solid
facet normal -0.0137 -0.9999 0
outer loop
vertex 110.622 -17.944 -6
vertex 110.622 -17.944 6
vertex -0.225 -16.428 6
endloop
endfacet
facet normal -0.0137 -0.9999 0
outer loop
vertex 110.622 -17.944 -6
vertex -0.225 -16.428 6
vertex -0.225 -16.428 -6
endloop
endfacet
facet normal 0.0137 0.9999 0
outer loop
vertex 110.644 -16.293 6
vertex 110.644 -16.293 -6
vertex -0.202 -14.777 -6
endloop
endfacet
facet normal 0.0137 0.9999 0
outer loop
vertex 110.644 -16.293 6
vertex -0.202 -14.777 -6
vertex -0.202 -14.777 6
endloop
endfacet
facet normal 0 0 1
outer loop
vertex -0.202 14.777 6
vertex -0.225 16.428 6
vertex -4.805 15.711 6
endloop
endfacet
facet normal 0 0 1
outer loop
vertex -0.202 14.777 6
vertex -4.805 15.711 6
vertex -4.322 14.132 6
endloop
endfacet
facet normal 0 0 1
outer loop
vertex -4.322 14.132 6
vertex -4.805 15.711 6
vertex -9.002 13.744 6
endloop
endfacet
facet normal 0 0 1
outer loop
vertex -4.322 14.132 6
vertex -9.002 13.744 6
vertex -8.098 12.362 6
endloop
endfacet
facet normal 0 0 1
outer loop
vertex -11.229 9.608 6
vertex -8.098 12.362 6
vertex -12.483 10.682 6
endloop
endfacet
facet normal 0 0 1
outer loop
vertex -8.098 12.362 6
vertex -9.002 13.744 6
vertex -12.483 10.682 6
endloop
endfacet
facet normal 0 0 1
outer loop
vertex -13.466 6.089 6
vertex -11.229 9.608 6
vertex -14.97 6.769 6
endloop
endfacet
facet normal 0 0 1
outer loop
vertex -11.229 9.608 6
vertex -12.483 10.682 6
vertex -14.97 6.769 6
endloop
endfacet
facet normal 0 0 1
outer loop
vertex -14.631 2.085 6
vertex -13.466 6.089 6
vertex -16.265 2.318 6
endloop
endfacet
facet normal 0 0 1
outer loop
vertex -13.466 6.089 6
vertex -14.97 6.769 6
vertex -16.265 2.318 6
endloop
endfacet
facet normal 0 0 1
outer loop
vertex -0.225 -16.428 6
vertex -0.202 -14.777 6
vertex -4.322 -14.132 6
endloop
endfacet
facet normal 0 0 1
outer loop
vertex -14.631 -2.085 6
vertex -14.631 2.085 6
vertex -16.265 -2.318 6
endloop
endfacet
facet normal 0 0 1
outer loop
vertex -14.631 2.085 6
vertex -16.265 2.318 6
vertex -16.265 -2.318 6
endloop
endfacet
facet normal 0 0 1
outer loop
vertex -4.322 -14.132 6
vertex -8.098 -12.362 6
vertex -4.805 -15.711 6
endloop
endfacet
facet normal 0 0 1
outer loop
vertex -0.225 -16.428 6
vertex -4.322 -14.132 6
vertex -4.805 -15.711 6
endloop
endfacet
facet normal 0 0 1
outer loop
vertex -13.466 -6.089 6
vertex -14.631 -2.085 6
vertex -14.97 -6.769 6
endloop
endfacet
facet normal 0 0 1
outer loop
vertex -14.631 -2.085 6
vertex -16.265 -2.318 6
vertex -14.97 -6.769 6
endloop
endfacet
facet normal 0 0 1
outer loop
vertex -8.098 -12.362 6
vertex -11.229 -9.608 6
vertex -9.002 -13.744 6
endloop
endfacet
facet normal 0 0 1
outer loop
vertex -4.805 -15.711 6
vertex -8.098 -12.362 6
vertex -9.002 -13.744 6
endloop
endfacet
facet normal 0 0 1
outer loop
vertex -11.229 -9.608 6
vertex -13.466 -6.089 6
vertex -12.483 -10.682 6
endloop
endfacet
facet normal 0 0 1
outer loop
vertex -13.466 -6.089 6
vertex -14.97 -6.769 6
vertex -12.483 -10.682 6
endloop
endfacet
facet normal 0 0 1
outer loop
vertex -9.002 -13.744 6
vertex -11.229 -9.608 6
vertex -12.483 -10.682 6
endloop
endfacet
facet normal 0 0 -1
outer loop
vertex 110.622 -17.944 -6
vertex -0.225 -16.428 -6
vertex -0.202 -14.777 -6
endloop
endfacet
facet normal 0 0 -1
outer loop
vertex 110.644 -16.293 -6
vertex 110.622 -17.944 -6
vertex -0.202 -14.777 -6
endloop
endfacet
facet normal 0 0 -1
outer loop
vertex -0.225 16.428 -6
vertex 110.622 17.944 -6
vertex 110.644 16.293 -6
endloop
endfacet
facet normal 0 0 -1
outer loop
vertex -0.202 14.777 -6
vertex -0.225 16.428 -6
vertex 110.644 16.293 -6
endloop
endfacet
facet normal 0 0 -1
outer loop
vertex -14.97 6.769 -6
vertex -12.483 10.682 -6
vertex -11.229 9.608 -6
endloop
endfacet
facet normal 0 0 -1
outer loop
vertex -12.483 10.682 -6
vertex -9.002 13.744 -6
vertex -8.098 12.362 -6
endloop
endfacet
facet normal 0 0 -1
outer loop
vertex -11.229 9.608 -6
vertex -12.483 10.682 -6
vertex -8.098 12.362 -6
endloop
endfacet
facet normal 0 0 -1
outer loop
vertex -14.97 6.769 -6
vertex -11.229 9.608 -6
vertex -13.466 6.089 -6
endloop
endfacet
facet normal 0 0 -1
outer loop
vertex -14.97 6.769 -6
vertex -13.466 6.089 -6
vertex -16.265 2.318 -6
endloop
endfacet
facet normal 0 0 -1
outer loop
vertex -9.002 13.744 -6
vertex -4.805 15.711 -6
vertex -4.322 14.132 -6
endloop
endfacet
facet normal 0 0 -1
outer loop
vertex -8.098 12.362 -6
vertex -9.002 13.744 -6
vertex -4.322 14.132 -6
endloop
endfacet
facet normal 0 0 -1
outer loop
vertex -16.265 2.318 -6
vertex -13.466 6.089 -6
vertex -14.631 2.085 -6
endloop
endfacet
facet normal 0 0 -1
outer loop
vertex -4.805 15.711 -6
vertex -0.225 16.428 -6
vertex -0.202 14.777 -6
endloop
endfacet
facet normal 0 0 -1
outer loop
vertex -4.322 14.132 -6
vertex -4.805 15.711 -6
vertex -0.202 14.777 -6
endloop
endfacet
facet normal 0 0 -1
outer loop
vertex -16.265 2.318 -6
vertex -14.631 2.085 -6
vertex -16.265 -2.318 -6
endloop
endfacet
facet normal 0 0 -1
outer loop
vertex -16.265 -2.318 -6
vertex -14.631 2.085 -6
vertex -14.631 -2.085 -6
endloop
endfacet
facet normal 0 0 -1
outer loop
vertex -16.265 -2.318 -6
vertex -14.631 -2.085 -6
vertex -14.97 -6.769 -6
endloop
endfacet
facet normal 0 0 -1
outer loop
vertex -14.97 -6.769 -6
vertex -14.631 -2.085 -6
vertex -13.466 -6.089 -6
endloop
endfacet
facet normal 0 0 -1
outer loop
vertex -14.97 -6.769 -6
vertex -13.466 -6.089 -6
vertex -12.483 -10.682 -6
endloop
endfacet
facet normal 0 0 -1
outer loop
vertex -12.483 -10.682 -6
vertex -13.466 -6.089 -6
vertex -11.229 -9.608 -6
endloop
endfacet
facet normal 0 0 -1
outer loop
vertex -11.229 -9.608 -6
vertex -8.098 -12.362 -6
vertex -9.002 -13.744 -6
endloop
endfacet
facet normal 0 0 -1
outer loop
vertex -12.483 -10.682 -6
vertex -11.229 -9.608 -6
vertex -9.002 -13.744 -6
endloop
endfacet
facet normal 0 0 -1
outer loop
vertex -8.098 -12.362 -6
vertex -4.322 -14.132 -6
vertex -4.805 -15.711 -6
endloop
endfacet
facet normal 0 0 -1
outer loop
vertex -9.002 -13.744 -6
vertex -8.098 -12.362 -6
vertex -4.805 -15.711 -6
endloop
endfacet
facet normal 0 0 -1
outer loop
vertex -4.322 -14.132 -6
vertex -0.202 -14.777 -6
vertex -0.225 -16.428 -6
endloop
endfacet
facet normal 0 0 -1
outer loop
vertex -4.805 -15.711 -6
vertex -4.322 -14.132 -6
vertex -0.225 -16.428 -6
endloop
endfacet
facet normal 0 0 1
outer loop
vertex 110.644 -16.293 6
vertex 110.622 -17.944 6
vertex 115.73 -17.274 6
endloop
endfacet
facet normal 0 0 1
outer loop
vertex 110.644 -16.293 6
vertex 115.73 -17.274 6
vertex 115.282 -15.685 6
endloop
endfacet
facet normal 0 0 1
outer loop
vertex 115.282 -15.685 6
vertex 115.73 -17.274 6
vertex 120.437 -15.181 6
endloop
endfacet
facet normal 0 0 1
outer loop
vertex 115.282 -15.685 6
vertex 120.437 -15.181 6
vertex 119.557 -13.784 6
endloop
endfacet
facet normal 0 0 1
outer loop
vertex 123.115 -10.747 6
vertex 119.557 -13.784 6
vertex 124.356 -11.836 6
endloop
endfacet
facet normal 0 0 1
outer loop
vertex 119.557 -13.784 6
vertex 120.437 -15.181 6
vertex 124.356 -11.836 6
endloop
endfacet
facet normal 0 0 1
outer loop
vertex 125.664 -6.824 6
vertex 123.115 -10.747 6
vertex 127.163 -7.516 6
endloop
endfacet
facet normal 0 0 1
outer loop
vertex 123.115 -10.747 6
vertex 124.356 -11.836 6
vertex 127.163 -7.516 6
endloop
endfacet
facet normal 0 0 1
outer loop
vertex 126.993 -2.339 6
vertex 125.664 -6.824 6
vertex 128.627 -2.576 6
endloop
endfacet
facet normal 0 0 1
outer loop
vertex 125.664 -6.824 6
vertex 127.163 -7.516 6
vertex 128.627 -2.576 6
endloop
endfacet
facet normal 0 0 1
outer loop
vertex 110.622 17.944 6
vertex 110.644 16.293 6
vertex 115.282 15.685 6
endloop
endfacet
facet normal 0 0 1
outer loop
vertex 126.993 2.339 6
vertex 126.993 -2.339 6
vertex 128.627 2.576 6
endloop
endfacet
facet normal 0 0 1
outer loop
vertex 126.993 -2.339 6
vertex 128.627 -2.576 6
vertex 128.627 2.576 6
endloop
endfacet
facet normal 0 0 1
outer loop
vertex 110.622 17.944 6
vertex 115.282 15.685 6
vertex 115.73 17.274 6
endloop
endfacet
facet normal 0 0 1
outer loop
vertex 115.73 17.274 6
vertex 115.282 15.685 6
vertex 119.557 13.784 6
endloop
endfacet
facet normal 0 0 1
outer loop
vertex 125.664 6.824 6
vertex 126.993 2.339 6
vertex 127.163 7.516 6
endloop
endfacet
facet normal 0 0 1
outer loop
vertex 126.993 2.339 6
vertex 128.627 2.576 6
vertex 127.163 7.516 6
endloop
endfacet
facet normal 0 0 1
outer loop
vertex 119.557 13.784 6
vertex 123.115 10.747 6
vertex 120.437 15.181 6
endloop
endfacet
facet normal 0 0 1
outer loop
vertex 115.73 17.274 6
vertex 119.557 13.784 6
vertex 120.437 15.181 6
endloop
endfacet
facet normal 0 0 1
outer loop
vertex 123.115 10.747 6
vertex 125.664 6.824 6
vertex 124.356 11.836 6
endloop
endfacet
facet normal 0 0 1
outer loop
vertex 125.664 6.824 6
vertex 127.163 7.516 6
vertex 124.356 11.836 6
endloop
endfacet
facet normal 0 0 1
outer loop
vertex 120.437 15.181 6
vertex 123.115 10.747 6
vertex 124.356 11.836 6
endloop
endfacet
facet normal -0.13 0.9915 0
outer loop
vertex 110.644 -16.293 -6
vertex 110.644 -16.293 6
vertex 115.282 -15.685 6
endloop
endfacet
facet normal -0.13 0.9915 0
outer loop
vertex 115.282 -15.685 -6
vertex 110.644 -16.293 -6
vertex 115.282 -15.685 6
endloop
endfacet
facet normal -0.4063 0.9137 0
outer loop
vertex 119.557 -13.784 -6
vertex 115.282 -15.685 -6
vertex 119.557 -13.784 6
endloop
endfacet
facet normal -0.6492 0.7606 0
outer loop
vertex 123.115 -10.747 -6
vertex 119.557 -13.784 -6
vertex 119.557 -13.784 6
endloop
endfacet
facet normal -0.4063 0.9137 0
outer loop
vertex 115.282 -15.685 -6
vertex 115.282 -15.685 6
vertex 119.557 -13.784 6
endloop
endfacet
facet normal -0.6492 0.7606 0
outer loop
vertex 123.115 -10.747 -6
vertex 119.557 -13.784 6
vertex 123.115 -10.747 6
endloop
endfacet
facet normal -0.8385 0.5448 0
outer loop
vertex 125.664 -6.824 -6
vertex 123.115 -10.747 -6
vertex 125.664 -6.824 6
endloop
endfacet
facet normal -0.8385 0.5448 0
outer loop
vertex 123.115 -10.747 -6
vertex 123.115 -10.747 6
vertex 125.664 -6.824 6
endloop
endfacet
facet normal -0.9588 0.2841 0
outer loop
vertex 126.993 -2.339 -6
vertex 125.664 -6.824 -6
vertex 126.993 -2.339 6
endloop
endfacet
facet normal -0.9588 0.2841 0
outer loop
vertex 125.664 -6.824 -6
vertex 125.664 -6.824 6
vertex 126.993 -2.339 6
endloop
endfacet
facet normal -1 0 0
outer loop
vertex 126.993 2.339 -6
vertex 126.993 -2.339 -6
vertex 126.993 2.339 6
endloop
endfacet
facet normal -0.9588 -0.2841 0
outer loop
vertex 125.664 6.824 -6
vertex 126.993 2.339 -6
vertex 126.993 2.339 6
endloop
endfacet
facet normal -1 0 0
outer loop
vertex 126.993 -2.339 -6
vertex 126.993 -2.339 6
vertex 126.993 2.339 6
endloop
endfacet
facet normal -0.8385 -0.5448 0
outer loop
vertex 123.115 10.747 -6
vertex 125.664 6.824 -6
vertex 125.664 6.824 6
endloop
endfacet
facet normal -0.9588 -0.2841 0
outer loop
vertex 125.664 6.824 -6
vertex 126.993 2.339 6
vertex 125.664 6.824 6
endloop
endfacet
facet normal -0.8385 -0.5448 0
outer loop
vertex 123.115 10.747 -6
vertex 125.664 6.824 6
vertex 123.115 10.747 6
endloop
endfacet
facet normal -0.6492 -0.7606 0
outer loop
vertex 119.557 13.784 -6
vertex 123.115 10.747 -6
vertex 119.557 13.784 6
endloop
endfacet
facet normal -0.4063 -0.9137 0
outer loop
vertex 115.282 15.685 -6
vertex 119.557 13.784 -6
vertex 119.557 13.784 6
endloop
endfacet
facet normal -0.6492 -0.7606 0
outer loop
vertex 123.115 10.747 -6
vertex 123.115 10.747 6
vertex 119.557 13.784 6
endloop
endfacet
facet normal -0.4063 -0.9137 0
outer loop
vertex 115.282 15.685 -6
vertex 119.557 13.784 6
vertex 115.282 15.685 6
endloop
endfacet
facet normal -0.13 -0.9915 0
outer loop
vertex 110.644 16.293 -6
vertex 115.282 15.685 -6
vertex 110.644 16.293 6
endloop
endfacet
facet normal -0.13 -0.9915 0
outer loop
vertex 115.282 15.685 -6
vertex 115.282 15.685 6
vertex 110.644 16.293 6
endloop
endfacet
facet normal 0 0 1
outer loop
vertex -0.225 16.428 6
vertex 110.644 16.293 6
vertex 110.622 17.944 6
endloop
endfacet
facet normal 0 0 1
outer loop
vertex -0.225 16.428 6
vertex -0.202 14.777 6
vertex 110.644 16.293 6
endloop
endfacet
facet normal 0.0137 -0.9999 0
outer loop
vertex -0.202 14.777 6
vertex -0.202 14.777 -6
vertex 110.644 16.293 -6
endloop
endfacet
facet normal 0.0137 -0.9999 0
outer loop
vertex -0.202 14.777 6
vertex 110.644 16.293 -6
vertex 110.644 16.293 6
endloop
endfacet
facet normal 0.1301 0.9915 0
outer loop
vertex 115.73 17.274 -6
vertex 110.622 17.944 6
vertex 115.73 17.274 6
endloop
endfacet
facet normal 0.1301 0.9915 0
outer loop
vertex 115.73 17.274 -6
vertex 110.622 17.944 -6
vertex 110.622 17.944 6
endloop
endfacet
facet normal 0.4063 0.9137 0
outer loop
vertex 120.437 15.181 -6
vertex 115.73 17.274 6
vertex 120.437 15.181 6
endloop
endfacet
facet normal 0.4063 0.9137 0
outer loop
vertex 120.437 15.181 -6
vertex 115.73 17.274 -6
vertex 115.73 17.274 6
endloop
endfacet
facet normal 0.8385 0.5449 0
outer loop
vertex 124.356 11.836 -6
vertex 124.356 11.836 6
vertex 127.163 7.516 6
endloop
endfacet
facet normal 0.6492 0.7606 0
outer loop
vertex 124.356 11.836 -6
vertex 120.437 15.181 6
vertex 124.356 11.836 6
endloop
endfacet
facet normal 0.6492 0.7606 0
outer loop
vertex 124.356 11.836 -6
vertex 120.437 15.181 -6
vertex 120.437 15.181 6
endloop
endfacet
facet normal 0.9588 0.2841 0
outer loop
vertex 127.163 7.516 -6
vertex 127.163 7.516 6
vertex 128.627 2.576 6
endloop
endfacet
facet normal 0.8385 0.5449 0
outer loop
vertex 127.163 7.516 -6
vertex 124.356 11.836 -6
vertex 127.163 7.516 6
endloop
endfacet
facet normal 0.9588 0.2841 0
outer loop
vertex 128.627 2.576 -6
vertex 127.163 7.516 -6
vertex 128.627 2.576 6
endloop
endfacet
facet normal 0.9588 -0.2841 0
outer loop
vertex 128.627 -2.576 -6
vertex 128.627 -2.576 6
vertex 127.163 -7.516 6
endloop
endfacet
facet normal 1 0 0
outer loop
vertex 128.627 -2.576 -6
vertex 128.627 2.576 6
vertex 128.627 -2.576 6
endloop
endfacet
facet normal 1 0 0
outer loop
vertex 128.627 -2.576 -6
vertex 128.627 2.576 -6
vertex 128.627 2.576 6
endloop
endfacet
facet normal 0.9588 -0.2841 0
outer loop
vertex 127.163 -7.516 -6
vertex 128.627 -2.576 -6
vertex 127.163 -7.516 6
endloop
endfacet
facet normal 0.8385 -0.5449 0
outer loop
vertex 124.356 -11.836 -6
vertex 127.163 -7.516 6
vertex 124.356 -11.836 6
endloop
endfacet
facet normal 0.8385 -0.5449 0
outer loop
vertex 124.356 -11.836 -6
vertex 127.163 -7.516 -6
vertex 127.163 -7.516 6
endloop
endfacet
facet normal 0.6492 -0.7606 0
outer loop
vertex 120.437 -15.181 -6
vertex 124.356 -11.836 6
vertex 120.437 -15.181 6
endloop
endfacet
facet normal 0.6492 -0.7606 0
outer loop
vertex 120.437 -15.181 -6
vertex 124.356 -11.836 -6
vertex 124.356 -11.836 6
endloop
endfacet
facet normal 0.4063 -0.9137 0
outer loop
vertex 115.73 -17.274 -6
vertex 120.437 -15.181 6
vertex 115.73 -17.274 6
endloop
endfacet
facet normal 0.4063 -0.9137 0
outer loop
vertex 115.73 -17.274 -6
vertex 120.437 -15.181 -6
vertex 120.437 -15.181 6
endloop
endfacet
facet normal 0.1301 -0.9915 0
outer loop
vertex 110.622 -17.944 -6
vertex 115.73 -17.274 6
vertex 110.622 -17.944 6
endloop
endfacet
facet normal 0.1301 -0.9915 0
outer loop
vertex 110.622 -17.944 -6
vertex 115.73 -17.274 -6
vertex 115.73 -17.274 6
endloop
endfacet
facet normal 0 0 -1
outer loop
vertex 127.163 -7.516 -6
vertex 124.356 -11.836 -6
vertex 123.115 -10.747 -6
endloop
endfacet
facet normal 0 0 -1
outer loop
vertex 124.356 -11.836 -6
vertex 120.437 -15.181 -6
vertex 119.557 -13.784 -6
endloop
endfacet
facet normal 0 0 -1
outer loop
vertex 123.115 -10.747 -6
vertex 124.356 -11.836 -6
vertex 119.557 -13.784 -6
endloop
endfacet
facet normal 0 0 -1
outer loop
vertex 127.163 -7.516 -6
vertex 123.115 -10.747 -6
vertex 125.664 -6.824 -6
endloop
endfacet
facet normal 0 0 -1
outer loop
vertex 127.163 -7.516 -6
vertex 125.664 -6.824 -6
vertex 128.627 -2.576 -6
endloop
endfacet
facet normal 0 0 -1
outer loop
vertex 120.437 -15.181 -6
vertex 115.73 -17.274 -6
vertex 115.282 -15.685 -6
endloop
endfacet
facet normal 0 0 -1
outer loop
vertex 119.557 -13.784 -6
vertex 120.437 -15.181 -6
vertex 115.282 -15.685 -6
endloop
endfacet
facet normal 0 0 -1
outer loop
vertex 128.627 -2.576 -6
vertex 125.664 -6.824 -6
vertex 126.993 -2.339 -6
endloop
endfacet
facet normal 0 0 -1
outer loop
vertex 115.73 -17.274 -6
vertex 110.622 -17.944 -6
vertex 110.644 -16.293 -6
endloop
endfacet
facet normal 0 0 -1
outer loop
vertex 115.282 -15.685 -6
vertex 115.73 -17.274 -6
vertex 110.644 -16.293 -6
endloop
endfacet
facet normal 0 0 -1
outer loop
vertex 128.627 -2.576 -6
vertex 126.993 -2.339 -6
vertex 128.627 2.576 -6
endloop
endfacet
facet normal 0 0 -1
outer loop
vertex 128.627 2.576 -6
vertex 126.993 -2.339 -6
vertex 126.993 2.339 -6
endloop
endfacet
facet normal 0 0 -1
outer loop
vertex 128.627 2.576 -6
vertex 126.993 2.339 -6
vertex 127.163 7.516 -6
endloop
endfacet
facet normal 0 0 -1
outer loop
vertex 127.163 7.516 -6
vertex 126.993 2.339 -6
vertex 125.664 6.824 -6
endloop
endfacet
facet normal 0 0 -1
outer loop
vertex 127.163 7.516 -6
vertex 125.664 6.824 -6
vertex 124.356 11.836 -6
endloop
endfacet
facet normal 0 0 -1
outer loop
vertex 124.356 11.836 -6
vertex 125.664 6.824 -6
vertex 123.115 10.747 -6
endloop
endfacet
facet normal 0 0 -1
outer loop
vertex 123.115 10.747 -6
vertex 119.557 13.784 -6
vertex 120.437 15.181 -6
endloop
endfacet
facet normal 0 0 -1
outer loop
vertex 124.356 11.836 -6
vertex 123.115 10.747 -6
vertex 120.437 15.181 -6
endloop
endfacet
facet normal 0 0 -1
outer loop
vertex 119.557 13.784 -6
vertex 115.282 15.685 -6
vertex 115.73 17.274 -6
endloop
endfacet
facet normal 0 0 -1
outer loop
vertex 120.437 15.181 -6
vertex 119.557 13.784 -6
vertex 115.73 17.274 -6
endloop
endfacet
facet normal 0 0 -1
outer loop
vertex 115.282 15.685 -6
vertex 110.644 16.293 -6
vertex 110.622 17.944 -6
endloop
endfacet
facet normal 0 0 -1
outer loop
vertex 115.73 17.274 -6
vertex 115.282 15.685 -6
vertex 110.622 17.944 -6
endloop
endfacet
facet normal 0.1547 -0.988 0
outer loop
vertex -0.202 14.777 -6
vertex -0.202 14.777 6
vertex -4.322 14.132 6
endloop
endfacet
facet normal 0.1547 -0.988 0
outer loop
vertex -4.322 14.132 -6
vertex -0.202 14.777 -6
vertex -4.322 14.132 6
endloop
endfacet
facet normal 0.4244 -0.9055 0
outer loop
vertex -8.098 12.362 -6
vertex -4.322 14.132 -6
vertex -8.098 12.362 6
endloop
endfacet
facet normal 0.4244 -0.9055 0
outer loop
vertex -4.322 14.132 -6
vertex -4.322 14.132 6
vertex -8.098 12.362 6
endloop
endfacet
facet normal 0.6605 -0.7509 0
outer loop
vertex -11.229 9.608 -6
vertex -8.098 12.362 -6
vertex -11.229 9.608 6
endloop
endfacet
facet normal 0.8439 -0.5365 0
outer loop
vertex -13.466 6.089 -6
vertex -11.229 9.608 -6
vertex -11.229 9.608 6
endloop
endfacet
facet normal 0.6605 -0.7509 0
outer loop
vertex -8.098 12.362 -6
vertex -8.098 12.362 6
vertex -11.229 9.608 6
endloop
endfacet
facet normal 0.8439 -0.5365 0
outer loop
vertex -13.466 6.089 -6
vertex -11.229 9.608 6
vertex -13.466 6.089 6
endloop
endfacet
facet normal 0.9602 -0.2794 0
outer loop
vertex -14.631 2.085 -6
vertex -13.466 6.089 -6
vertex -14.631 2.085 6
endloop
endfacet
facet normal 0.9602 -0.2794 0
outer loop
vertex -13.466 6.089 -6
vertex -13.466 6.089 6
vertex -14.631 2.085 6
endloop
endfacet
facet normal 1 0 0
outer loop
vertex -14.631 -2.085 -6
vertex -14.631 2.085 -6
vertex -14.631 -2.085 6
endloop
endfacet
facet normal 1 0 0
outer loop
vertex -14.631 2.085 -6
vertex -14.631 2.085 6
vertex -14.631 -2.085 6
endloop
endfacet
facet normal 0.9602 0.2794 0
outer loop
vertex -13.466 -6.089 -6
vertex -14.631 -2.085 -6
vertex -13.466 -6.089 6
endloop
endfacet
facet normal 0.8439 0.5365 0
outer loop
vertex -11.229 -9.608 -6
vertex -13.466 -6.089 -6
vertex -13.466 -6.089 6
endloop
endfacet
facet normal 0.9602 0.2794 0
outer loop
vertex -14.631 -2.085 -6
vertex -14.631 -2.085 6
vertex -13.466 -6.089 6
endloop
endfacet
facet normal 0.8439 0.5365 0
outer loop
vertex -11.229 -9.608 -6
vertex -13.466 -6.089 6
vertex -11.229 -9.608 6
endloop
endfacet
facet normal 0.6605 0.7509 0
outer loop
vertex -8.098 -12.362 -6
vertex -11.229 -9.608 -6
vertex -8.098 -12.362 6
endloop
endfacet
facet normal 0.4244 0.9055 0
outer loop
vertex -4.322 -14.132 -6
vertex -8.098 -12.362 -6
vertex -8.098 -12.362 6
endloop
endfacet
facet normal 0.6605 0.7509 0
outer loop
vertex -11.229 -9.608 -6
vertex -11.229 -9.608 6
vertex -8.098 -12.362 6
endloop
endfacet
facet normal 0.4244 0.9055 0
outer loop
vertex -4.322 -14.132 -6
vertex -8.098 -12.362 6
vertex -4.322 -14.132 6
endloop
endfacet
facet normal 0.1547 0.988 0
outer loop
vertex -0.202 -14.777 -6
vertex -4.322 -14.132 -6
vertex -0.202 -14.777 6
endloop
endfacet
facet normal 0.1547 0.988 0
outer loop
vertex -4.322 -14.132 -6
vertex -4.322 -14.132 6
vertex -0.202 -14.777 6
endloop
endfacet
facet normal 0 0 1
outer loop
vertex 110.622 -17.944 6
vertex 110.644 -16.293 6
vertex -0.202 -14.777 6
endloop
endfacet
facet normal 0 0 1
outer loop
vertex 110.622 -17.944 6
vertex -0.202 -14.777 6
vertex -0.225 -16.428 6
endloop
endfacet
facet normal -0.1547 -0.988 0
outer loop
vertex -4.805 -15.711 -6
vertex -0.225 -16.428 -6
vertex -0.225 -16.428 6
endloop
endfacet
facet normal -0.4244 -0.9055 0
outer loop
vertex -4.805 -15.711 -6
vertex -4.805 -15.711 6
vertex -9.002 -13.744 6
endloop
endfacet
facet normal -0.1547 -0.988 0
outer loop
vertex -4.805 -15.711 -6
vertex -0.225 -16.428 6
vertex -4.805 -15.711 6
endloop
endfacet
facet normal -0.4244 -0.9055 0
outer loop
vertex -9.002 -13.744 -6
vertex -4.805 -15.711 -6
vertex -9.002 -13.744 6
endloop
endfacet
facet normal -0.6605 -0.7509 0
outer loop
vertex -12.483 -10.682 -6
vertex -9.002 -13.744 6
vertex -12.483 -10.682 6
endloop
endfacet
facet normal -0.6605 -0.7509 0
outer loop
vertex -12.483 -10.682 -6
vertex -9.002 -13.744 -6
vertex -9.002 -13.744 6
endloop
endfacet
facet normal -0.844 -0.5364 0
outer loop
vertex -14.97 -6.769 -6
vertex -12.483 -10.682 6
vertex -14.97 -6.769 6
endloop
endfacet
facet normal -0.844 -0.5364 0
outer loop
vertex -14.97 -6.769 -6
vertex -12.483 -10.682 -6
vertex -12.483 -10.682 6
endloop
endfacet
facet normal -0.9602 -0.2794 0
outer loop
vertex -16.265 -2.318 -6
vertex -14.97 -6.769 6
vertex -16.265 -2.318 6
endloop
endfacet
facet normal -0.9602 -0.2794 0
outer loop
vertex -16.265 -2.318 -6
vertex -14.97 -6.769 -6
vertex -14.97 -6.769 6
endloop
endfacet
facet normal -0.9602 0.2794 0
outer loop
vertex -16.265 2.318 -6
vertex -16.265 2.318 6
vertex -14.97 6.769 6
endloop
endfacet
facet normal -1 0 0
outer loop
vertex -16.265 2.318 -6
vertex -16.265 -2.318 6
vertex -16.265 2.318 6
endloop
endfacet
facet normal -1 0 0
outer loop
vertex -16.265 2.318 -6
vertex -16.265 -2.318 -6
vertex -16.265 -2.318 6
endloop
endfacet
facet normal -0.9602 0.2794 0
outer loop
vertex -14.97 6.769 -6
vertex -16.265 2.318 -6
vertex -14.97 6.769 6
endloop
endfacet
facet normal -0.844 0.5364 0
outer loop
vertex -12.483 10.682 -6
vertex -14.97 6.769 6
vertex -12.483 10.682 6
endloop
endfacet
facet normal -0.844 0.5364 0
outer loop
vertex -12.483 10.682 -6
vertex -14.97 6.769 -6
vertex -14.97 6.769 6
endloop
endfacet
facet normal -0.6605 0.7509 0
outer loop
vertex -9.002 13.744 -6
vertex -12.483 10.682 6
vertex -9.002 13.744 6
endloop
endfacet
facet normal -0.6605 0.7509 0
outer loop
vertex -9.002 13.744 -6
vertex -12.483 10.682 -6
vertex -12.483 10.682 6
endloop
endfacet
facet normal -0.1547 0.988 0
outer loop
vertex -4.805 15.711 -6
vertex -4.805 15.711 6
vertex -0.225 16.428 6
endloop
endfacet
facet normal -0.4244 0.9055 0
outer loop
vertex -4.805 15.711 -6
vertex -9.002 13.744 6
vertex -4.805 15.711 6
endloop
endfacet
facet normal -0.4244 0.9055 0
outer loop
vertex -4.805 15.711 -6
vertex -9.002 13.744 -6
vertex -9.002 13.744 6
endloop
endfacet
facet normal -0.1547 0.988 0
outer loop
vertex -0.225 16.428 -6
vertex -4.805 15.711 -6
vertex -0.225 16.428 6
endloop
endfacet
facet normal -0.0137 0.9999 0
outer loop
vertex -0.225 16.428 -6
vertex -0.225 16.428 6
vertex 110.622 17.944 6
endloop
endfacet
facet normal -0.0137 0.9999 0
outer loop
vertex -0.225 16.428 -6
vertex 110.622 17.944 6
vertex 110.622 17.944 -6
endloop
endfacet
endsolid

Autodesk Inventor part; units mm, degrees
sketch "Sketch Path" plane through (0, 0, 0) normal (0, 0, 1) x (1, 0, 0)
  arc A0 (-0.2073, 15.1581) -> (-0.2073, -15.1581) centre (0, 0) ccw
  arc A1 (110.639, -16.6739) -> (110.639, 16.6739) centre (110.867, 0) ccw
  line L0 (110.639, -16.6739) -> (-0.2073, -15.1581)
  line L1 (-0.2073, 15.1581) -> (110.639, 16.6739)
ref_plane "Cross Section Plane" through (-0.2073, -15.1581, 0) normal (0.9999, -0.0137, 0) x (0, 0, 1)
ref_plane "Work Plane2" through (0, 0, 0) normal (0.309, 0.9511, 0) x (0, 0, 1)
ref_plane "Work Plane3" through (110.867, 0, 0) normal (-0.979, 0.2038, 0) x (0, 0, 1)
sketch "Cross Section" plane through (-0.2073, -15.1581, 0) normal (0.9999, -0.0137, 0) x (0, 0, 1)
  line L0 (-6, 1.27) -> (6, 1.27)
  line L1 (6, 1.27) -> (6, -0.381)
  line L2 (6, -0.381) -> (-6, -0.381)
  line L3 (-6, -0.381) -> (-6, 1.27)
  line L4 (-6, 0) -> (6, 0) construction
  point P0 (0, 0)
  point P1 (0, 0)
  dimension "d0" = 12
  dimension "d4" = 0.381
  dimension "d5" = 1.27
sweep "Belt" add profiles "Cross Section" path "Sketch Path"
equation "\"d4\" = da_a"
equation "\"d5\" = da_a2"
equation "\"da_B\" = 19.05"
equation "\"da_pb\" = 9.525"
equation "\"da_L\" = 321.76723"
equation "\"da_a\" = 0.381"
equation "\"da_S\" = 4.6482"
equation "\"da_Beta\" = 20deg"
equation "\"da_Ht\" = 1.905"
equation "\"da_H\" = 3.556"
equation "\"da_a2\" = 1.27"
properties part number "Synchronous Belt" material "Rubber"
